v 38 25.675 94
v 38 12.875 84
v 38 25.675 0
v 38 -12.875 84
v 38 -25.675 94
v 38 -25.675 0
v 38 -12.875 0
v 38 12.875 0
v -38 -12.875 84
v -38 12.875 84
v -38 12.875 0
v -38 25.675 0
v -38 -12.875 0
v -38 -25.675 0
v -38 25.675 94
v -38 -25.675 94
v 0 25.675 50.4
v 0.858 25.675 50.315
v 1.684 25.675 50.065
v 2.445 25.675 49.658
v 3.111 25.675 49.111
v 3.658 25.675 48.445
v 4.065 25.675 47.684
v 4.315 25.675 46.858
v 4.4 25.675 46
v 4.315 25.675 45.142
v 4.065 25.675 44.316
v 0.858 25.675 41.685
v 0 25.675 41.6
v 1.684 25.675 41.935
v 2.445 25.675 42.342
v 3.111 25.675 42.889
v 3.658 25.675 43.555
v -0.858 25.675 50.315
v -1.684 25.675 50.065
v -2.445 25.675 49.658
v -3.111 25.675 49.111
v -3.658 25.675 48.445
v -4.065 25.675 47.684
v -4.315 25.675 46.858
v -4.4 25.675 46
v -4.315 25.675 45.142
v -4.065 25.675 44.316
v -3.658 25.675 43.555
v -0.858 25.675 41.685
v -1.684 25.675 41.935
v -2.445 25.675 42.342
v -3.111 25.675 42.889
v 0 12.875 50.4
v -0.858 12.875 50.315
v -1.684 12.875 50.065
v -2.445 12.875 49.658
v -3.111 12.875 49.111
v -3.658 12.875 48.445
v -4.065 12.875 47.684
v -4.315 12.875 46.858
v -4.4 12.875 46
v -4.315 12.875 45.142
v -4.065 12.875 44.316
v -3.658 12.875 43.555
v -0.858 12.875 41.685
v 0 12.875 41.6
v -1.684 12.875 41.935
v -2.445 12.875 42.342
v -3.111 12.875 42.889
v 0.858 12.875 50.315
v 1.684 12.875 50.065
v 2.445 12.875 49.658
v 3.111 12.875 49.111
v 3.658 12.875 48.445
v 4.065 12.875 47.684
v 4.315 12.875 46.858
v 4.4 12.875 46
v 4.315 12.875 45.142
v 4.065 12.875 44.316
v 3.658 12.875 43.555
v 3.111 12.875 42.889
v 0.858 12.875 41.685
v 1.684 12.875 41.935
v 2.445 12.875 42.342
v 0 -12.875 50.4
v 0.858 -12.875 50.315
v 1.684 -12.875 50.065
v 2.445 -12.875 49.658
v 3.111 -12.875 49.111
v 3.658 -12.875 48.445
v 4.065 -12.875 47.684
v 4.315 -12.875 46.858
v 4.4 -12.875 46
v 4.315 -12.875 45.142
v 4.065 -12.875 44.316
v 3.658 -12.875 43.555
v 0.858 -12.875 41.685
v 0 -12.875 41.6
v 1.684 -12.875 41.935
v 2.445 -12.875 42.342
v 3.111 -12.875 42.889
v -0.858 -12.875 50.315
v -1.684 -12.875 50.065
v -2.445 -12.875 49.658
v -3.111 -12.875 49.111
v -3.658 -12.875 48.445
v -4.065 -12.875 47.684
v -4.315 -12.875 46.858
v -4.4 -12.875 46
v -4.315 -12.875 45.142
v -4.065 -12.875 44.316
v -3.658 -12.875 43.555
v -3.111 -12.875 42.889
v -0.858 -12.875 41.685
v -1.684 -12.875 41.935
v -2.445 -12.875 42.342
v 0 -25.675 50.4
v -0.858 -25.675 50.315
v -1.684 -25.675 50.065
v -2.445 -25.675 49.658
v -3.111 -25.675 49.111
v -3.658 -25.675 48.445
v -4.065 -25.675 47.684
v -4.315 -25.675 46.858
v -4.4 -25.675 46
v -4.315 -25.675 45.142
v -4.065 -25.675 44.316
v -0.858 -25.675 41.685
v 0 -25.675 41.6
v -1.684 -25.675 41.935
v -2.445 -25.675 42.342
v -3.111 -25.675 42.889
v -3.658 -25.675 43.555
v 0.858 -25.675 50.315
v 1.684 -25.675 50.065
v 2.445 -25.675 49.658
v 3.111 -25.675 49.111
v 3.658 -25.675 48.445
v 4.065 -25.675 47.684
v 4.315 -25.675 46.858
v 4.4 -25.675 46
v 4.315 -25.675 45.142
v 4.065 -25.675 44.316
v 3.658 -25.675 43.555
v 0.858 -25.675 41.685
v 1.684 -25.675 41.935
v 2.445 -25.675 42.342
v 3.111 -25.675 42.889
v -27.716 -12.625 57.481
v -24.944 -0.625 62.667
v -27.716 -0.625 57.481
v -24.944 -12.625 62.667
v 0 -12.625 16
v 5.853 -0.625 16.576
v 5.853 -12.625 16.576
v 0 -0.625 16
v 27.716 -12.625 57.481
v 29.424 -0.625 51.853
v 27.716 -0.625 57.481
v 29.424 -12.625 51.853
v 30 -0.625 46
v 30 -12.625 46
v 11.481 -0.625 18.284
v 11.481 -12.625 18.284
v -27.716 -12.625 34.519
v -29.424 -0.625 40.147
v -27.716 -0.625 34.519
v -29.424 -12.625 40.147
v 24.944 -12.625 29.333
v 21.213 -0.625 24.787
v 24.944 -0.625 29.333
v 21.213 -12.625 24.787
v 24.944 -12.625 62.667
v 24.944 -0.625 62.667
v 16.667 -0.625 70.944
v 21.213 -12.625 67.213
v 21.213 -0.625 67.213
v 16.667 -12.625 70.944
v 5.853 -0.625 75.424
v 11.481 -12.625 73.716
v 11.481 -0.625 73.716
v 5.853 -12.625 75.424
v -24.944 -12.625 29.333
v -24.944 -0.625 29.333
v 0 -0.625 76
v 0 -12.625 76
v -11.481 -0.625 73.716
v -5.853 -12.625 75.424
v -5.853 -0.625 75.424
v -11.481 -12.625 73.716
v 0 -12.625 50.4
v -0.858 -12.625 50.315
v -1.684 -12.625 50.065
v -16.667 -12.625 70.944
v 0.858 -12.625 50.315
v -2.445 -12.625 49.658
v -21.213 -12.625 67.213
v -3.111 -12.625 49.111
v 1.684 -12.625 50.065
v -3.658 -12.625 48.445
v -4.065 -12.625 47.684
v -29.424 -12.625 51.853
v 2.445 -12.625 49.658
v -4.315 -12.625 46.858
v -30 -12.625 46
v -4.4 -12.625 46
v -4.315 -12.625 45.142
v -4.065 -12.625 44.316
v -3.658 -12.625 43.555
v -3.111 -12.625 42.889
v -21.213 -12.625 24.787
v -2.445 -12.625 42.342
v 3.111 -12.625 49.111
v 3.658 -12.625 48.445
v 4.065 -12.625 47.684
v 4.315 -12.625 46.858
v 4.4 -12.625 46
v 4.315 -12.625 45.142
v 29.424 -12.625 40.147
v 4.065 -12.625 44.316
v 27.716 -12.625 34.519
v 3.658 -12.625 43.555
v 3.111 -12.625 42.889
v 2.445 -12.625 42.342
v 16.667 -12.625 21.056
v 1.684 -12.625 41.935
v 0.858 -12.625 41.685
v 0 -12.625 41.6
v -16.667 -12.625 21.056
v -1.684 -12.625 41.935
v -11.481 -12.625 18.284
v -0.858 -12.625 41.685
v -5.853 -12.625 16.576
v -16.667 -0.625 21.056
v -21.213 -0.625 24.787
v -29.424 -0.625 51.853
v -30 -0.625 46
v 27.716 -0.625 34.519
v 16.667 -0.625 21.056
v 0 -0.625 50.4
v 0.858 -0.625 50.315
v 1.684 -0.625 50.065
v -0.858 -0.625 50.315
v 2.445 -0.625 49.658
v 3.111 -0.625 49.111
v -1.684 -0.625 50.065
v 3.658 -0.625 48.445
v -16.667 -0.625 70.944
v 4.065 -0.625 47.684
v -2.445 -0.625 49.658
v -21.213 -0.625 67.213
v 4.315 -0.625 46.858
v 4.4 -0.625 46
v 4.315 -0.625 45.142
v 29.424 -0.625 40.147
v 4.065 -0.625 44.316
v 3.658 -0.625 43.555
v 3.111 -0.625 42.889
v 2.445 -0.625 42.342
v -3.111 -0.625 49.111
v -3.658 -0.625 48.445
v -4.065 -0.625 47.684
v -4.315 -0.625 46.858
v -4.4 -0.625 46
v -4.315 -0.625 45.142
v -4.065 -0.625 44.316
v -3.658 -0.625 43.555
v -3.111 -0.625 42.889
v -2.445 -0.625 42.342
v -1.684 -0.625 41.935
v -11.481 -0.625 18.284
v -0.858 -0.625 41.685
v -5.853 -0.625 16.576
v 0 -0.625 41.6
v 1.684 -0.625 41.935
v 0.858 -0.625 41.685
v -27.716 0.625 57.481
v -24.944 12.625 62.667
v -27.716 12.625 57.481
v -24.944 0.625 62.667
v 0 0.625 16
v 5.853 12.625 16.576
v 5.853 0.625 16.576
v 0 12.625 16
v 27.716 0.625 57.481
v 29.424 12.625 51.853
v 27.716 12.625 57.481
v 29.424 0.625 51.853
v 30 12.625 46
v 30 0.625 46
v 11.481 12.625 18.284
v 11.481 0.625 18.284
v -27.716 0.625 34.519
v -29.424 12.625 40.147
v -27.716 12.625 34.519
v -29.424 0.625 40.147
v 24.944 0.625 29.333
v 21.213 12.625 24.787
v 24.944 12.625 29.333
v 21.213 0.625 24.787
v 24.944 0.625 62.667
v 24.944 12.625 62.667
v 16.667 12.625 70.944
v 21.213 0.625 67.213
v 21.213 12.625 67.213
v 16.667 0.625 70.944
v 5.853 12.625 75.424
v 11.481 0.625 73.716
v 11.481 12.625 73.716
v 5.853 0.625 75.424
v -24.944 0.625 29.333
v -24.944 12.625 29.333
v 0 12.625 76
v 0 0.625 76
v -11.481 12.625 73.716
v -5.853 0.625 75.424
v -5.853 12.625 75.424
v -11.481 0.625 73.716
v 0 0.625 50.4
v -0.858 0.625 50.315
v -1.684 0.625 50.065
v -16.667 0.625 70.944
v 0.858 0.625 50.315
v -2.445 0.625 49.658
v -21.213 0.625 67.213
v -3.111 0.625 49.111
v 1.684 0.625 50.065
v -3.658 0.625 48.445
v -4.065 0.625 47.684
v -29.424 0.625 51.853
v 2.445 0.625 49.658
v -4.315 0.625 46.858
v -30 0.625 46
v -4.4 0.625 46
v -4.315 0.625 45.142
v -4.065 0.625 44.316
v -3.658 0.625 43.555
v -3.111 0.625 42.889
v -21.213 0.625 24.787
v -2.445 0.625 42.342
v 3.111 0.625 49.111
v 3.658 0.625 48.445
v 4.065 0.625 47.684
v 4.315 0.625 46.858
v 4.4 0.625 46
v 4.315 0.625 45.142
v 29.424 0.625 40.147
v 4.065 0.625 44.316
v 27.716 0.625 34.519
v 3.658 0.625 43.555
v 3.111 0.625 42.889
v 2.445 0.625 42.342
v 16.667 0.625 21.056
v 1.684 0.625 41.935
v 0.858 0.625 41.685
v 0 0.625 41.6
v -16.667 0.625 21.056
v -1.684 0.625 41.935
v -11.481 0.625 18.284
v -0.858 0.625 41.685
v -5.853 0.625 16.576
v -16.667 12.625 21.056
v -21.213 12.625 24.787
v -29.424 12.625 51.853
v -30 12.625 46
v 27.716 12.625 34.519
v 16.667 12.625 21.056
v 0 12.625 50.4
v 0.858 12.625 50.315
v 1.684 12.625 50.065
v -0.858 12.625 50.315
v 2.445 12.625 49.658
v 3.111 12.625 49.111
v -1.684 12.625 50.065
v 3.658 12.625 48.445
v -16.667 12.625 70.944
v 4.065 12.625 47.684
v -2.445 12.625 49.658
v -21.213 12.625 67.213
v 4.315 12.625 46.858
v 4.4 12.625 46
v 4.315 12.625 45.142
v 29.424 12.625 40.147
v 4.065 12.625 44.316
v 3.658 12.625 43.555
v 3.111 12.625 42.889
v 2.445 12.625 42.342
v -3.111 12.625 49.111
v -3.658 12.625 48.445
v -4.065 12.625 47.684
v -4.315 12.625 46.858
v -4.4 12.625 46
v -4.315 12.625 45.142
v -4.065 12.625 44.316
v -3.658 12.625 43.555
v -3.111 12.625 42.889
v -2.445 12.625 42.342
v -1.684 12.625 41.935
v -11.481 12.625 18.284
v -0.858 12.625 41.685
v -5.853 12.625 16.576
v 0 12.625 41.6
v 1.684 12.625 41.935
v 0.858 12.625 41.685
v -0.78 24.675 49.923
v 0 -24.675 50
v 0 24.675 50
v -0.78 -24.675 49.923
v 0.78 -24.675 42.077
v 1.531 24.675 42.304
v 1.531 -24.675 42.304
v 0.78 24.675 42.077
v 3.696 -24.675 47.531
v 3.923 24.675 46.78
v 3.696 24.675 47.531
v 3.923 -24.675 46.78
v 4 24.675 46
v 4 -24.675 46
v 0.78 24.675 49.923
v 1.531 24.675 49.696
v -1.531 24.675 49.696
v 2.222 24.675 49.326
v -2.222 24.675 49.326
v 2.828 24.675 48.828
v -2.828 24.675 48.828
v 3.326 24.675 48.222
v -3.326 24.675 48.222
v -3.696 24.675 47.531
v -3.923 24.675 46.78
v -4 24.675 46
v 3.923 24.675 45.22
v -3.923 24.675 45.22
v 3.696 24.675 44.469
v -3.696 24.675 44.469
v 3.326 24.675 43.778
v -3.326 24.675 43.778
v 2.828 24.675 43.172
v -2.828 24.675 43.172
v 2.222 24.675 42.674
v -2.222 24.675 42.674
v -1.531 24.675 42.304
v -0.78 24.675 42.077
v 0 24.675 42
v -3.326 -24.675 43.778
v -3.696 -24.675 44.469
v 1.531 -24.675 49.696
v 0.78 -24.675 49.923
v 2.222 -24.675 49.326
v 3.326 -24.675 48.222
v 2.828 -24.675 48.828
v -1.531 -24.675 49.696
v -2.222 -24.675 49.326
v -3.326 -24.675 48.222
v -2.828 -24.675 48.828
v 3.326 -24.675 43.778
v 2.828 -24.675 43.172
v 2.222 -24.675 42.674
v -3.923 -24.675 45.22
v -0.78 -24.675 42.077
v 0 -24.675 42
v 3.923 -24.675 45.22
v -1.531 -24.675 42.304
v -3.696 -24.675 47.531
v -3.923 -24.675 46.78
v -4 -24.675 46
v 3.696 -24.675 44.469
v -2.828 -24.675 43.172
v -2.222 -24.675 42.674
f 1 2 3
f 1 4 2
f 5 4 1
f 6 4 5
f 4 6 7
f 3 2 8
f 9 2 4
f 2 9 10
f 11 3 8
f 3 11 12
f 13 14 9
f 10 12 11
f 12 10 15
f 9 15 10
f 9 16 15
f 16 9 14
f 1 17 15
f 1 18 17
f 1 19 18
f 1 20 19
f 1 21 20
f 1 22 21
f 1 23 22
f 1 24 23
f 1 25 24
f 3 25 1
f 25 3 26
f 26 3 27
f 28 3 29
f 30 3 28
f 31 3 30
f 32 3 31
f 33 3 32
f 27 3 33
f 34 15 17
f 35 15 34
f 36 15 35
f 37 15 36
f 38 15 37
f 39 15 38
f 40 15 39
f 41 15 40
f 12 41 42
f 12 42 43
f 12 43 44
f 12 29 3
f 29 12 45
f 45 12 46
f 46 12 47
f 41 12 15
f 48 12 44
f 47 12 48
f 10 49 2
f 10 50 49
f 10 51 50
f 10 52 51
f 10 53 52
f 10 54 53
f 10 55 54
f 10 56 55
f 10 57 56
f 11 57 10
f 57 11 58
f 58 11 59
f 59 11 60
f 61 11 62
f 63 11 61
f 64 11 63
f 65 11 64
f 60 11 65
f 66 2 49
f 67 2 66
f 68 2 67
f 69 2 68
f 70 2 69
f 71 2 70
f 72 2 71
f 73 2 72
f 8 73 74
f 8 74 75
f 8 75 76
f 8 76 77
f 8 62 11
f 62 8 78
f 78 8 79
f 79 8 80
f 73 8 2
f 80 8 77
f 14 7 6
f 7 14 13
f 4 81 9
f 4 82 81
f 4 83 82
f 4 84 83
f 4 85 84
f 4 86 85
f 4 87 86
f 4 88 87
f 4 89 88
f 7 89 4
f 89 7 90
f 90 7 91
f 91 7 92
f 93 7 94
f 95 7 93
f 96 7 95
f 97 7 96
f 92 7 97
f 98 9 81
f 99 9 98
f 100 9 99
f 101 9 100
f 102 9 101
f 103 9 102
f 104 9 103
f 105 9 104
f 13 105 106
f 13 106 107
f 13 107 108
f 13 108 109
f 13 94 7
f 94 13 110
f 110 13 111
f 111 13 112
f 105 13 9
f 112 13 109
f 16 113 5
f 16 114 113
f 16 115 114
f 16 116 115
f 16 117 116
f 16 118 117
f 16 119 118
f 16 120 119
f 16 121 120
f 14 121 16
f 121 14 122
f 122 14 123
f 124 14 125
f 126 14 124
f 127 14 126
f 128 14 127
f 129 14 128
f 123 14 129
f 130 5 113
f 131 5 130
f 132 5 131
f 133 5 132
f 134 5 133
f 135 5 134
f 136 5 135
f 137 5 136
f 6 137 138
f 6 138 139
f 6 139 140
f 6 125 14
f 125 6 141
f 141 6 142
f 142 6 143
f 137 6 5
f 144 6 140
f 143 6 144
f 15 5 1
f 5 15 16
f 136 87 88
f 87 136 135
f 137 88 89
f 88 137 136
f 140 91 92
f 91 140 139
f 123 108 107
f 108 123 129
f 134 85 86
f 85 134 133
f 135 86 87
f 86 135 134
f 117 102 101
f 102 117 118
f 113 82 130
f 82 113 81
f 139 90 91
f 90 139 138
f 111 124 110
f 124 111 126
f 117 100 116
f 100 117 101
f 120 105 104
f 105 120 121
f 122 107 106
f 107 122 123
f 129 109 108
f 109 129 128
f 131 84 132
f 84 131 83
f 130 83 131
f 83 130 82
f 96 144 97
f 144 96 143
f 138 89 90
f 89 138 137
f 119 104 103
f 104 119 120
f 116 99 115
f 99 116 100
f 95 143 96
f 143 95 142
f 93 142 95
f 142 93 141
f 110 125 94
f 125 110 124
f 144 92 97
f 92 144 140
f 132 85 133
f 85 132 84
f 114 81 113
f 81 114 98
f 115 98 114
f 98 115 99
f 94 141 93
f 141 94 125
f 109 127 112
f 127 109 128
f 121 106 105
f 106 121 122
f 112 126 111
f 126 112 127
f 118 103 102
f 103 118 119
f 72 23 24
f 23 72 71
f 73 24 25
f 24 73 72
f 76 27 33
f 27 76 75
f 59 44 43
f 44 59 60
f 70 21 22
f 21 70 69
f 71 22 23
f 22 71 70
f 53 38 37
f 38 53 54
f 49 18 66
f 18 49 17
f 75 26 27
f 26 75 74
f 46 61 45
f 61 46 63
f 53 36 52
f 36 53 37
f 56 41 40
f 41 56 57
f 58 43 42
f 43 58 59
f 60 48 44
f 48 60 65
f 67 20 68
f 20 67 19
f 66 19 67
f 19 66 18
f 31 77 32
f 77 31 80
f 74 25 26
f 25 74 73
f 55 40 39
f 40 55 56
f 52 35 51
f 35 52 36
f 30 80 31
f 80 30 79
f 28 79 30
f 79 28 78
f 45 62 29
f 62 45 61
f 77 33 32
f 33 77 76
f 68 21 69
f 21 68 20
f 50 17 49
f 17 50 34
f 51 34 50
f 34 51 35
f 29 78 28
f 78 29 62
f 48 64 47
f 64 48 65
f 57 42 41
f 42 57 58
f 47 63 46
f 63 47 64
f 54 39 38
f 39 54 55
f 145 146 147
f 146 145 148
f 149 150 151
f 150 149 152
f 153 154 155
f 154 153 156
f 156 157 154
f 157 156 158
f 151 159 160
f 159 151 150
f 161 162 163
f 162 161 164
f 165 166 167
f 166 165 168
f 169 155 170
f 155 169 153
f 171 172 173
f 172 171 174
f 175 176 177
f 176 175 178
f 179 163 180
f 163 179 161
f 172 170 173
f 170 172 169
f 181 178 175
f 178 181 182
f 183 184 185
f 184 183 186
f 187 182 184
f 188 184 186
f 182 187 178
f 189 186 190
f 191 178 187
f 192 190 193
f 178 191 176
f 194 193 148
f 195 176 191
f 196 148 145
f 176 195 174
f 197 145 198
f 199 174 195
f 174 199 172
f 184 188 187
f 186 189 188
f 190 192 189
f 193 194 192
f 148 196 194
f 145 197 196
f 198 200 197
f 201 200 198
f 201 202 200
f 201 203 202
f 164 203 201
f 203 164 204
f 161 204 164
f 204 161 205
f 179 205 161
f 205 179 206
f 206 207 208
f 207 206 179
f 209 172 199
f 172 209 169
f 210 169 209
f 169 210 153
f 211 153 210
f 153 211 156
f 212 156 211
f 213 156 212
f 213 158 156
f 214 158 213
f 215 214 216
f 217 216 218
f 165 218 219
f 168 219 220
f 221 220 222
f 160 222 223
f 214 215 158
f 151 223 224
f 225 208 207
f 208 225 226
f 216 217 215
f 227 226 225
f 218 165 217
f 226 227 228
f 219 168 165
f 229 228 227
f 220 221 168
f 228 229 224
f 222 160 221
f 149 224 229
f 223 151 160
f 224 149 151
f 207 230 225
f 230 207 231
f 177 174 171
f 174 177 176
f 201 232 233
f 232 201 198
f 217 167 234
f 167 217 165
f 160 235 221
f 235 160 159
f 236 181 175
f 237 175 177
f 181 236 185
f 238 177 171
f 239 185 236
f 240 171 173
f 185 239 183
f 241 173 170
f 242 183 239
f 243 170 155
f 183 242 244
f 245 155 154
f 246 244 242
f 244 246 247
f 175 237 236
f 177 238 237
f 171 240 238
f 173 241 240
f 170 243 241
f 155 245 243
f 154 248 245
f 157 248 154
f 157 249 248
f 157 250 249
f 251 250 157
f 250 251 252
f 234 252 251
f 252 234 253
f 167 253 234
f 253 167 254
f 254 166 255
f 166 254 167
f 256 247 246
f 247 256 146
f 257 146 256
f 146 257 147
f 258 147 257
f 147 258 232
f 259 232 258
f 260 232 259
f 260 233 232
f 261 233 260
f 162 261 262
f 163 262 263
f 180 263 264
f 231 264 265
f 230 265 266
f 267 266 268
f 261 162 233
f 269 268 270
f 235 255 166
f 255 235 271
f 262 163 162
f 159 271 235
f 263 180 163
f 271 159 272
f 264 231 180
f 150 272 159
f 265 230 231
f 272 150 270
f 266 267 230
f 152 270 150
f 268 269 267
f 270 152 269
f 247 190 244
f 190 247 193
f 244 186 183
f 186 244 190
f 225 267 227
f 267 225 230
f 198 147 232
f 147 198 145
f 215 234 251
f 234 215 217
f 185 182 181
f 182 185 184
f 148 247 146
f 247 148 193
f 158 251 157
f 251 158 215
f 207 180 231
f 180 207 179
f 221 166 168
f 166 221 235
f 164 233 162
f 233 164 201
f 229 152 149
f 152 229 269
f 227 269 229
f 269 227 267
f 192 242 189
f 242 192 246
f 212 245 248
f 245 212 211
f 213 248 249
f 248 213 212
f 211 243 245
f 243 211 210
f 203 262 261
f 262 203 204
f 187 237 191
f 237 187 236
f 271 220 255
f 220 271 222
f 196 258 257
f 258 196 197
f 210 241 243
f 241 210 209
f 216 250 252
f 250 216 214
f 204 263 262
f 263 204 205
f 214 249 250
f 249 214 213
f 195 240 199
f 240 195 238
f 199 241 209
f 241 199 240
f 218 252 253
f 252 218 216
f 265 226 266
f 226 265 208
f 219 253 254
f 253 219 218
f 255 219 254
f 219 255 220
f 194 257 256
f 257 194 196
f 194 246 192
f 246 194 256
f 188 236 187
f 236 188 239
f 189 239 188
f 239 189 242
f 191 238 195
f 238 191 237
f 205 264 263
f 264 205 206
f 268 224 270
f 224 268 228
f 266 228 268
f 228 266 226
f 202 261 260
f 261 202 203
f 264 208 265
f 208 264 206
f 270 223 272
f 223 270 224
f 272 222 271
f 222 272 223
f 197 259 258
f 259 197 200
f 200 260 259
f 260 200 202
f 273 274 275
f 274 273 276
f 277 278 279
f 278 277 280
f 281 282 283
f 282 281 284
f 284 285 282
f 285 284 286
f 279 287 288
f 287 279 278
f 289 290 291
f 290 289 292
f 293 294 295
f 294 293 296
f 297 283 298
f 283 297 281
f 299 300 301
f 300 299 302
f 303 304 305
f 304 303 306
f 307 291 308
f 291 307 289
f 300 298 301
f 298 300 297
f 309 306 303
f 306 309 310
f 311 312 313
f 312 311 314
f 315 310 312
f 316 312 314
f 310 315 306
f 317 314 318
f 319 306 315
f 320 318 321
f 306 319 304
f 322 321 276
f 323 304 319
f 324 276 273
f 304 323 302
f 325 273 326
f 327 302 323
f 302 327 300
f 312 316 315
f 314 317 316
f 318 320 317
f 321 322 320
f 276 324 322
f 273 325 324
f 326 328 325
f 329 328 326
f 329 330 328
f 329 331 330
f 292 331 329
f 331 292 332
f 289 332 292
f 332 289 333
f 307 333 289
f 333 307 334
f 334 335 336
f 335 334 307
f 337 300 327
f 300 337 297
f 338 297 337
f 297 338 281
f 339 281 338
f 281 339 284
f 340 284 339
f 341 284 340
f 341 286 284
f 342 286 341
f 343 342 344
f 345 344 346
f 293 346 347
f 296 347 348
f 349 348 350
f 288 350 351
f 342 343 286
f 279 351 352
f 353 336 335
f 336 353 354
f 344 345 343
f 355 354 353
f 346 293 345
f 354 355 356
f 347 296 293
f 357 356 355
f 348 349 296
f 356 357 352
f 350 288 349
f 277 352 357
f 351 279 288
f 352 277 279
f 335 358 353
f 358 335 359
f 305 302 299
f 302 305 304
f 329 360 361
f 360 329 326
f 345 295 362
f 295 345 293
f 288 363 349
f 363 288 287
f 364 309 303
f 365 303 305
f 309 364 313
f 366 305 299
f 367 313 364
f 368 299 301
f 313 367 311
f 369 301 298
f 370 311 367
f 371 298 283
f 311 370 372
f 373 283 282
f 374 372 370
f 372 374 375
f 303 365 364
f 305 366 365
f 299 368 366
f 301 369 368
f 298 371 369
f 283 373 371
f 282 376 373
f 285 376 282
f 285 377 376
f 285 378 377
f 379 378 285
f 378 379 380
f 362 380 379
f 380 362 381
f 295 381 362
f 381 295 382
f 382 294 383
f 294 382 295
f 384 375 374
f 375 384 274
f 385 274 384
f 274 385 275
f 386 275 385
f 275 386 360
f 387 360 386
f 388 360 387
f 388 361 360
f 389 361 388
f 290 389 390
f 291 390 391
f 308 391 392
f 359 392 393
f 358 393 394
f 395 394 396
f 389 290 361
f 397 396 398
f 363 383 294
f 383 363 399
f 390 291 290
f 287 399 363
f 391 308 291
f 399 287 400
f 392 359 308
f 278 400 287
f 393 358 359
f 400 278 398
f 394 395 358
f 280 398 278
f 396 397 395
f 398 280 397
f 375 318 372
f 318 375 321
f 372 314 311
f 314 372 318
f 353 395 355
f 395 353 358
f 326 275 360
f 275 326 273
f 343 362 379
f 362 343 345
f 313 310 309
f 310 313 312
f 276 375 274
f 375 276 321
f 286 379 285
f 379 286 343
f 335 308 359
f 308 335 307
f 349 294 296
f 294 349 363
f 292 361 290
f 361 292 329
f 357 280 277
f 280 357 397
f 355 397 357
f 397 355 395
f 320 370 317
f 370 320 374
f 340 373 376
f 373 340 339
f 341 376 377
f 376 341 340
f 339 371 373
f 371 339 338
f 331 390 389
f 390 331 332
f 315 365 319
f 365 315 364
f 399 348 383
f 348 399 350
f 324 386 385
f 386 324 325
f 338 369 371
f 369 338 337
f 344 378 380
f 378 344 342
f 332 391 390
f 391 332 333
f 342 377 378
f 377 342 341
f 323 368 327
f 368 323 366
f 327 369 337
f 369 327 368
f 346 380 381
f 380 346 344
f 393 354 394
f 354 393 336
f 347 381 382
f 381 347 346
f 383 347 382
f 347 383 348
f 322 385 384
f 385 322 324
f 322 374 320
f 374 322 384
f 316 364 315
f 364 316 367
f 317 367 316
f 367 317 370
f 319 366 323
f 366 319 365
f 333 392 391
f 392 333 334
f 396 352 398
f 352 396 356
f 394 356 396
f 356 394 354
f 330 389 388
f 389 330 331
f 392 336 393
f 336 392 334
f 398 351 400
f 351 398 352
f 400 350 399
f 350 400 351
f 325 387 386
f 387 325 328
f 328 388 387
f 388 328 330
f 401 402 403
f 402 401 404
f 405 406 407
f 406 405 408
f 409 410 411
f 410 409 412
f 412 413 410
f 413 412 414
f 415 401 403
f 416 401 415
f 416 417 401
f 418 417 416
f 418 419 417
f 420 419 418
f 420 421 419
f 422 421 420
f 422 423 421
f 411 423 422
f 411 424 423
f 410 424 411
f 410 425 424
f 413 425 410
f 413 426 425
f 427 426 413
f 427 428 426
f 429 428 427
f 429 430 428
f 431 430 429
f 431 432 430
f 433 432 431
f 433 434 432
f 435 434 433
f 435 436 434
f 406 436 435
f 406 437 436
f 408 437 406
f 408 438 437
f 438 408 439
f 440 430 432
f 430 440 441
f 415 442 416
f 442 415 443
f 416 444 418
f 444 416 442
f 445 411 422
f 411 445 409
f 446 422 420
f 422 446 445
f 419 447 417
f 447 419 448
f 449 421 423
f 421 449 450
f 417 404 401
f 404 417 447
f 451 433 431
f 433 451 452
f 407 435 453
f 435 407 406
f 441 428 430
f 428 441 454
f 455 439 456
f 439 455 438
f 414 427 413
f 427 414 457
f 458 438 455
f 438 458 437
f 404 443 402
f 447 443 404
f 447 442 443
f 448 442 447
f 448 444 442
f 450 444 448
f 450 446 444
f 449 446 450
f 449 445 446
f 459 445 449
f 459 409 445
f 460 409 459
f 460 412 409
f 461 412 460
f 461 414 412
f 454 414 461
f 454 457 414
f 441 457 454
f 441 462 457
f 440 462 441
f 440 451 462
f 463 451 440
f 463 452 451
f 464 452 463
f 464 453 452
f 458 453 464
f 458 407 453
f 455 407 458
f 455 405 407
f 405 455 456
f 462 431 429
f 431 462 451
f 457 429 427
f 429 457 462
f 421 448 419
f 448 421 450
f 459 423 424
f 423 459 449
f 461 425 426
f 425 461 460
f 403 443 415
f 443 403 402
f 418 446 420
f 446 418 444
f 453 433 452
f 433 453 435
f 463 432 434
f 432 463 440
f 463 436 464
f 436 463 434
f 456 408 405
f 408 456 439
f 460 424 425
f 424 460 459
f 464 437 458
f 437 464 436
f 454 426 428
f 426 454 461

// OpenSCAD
$fn = 32;

// ------------------------------------------------------------------------
// Trolley wheel set: wheels d60, fork 84 mm tall
// Every part is its own module, assembly() places every instance.
// ------------------------------------------------------------------------

// --- part 1 ---
module trolley_fork() {
  difference() {
    union() {
      translate([-38, 12.875, 0]) cube([76, 12.8, 84]);
      translate([-38, -25.675, 0]) cube([76, 12.8, 84]);
      translate([-38, -25.675, 84]) cube([76, 51.35, 10]);
    }
    translate([0, -19.275, 46]) rotate([90, 0, 0]) cylinder(h = 14.8, d = 8.8, center = true);
    translate([0, 19.275, 46]) rotate([90, 0, 0]) cylinder(h = 14.8, d = 8.8, center = true);
  }
}

// --- part 2 ---
module trolley_wheel() {
  difference() {
      translate([0, 0, 0]) cylinder(h = 12, d = 60);
      translate([0, 0, -1]) cylinder(h = 14, d = 8.8);
    }
}

// --- part 3 ---
module trolley_axle() {
  translate([0, 0, -24.675]) cylinder(h = 49.35, d = 8);
}

// --- assembly ---
module assembly() {
  color([0.80, 0.24, 0.20]) translate([0, 0, 0]) rotate([0, 0, 0]) trolley_fork();
  color([0.20, 0.45, 0.75]) translate([0, -0.625, 46]) rotate([90, 0, 0]) trolley_wheel();
  color([0.25, 0.62, 0.32]) translate([0, 12.625, 46]) rotate([90, 0, 0]) trolley_wheel();
  color([0.92, 0.70, 0.18]) translate([0, 0, 46]) rotate([90, 0, 0]) trolley_axle();
}

assembly();
